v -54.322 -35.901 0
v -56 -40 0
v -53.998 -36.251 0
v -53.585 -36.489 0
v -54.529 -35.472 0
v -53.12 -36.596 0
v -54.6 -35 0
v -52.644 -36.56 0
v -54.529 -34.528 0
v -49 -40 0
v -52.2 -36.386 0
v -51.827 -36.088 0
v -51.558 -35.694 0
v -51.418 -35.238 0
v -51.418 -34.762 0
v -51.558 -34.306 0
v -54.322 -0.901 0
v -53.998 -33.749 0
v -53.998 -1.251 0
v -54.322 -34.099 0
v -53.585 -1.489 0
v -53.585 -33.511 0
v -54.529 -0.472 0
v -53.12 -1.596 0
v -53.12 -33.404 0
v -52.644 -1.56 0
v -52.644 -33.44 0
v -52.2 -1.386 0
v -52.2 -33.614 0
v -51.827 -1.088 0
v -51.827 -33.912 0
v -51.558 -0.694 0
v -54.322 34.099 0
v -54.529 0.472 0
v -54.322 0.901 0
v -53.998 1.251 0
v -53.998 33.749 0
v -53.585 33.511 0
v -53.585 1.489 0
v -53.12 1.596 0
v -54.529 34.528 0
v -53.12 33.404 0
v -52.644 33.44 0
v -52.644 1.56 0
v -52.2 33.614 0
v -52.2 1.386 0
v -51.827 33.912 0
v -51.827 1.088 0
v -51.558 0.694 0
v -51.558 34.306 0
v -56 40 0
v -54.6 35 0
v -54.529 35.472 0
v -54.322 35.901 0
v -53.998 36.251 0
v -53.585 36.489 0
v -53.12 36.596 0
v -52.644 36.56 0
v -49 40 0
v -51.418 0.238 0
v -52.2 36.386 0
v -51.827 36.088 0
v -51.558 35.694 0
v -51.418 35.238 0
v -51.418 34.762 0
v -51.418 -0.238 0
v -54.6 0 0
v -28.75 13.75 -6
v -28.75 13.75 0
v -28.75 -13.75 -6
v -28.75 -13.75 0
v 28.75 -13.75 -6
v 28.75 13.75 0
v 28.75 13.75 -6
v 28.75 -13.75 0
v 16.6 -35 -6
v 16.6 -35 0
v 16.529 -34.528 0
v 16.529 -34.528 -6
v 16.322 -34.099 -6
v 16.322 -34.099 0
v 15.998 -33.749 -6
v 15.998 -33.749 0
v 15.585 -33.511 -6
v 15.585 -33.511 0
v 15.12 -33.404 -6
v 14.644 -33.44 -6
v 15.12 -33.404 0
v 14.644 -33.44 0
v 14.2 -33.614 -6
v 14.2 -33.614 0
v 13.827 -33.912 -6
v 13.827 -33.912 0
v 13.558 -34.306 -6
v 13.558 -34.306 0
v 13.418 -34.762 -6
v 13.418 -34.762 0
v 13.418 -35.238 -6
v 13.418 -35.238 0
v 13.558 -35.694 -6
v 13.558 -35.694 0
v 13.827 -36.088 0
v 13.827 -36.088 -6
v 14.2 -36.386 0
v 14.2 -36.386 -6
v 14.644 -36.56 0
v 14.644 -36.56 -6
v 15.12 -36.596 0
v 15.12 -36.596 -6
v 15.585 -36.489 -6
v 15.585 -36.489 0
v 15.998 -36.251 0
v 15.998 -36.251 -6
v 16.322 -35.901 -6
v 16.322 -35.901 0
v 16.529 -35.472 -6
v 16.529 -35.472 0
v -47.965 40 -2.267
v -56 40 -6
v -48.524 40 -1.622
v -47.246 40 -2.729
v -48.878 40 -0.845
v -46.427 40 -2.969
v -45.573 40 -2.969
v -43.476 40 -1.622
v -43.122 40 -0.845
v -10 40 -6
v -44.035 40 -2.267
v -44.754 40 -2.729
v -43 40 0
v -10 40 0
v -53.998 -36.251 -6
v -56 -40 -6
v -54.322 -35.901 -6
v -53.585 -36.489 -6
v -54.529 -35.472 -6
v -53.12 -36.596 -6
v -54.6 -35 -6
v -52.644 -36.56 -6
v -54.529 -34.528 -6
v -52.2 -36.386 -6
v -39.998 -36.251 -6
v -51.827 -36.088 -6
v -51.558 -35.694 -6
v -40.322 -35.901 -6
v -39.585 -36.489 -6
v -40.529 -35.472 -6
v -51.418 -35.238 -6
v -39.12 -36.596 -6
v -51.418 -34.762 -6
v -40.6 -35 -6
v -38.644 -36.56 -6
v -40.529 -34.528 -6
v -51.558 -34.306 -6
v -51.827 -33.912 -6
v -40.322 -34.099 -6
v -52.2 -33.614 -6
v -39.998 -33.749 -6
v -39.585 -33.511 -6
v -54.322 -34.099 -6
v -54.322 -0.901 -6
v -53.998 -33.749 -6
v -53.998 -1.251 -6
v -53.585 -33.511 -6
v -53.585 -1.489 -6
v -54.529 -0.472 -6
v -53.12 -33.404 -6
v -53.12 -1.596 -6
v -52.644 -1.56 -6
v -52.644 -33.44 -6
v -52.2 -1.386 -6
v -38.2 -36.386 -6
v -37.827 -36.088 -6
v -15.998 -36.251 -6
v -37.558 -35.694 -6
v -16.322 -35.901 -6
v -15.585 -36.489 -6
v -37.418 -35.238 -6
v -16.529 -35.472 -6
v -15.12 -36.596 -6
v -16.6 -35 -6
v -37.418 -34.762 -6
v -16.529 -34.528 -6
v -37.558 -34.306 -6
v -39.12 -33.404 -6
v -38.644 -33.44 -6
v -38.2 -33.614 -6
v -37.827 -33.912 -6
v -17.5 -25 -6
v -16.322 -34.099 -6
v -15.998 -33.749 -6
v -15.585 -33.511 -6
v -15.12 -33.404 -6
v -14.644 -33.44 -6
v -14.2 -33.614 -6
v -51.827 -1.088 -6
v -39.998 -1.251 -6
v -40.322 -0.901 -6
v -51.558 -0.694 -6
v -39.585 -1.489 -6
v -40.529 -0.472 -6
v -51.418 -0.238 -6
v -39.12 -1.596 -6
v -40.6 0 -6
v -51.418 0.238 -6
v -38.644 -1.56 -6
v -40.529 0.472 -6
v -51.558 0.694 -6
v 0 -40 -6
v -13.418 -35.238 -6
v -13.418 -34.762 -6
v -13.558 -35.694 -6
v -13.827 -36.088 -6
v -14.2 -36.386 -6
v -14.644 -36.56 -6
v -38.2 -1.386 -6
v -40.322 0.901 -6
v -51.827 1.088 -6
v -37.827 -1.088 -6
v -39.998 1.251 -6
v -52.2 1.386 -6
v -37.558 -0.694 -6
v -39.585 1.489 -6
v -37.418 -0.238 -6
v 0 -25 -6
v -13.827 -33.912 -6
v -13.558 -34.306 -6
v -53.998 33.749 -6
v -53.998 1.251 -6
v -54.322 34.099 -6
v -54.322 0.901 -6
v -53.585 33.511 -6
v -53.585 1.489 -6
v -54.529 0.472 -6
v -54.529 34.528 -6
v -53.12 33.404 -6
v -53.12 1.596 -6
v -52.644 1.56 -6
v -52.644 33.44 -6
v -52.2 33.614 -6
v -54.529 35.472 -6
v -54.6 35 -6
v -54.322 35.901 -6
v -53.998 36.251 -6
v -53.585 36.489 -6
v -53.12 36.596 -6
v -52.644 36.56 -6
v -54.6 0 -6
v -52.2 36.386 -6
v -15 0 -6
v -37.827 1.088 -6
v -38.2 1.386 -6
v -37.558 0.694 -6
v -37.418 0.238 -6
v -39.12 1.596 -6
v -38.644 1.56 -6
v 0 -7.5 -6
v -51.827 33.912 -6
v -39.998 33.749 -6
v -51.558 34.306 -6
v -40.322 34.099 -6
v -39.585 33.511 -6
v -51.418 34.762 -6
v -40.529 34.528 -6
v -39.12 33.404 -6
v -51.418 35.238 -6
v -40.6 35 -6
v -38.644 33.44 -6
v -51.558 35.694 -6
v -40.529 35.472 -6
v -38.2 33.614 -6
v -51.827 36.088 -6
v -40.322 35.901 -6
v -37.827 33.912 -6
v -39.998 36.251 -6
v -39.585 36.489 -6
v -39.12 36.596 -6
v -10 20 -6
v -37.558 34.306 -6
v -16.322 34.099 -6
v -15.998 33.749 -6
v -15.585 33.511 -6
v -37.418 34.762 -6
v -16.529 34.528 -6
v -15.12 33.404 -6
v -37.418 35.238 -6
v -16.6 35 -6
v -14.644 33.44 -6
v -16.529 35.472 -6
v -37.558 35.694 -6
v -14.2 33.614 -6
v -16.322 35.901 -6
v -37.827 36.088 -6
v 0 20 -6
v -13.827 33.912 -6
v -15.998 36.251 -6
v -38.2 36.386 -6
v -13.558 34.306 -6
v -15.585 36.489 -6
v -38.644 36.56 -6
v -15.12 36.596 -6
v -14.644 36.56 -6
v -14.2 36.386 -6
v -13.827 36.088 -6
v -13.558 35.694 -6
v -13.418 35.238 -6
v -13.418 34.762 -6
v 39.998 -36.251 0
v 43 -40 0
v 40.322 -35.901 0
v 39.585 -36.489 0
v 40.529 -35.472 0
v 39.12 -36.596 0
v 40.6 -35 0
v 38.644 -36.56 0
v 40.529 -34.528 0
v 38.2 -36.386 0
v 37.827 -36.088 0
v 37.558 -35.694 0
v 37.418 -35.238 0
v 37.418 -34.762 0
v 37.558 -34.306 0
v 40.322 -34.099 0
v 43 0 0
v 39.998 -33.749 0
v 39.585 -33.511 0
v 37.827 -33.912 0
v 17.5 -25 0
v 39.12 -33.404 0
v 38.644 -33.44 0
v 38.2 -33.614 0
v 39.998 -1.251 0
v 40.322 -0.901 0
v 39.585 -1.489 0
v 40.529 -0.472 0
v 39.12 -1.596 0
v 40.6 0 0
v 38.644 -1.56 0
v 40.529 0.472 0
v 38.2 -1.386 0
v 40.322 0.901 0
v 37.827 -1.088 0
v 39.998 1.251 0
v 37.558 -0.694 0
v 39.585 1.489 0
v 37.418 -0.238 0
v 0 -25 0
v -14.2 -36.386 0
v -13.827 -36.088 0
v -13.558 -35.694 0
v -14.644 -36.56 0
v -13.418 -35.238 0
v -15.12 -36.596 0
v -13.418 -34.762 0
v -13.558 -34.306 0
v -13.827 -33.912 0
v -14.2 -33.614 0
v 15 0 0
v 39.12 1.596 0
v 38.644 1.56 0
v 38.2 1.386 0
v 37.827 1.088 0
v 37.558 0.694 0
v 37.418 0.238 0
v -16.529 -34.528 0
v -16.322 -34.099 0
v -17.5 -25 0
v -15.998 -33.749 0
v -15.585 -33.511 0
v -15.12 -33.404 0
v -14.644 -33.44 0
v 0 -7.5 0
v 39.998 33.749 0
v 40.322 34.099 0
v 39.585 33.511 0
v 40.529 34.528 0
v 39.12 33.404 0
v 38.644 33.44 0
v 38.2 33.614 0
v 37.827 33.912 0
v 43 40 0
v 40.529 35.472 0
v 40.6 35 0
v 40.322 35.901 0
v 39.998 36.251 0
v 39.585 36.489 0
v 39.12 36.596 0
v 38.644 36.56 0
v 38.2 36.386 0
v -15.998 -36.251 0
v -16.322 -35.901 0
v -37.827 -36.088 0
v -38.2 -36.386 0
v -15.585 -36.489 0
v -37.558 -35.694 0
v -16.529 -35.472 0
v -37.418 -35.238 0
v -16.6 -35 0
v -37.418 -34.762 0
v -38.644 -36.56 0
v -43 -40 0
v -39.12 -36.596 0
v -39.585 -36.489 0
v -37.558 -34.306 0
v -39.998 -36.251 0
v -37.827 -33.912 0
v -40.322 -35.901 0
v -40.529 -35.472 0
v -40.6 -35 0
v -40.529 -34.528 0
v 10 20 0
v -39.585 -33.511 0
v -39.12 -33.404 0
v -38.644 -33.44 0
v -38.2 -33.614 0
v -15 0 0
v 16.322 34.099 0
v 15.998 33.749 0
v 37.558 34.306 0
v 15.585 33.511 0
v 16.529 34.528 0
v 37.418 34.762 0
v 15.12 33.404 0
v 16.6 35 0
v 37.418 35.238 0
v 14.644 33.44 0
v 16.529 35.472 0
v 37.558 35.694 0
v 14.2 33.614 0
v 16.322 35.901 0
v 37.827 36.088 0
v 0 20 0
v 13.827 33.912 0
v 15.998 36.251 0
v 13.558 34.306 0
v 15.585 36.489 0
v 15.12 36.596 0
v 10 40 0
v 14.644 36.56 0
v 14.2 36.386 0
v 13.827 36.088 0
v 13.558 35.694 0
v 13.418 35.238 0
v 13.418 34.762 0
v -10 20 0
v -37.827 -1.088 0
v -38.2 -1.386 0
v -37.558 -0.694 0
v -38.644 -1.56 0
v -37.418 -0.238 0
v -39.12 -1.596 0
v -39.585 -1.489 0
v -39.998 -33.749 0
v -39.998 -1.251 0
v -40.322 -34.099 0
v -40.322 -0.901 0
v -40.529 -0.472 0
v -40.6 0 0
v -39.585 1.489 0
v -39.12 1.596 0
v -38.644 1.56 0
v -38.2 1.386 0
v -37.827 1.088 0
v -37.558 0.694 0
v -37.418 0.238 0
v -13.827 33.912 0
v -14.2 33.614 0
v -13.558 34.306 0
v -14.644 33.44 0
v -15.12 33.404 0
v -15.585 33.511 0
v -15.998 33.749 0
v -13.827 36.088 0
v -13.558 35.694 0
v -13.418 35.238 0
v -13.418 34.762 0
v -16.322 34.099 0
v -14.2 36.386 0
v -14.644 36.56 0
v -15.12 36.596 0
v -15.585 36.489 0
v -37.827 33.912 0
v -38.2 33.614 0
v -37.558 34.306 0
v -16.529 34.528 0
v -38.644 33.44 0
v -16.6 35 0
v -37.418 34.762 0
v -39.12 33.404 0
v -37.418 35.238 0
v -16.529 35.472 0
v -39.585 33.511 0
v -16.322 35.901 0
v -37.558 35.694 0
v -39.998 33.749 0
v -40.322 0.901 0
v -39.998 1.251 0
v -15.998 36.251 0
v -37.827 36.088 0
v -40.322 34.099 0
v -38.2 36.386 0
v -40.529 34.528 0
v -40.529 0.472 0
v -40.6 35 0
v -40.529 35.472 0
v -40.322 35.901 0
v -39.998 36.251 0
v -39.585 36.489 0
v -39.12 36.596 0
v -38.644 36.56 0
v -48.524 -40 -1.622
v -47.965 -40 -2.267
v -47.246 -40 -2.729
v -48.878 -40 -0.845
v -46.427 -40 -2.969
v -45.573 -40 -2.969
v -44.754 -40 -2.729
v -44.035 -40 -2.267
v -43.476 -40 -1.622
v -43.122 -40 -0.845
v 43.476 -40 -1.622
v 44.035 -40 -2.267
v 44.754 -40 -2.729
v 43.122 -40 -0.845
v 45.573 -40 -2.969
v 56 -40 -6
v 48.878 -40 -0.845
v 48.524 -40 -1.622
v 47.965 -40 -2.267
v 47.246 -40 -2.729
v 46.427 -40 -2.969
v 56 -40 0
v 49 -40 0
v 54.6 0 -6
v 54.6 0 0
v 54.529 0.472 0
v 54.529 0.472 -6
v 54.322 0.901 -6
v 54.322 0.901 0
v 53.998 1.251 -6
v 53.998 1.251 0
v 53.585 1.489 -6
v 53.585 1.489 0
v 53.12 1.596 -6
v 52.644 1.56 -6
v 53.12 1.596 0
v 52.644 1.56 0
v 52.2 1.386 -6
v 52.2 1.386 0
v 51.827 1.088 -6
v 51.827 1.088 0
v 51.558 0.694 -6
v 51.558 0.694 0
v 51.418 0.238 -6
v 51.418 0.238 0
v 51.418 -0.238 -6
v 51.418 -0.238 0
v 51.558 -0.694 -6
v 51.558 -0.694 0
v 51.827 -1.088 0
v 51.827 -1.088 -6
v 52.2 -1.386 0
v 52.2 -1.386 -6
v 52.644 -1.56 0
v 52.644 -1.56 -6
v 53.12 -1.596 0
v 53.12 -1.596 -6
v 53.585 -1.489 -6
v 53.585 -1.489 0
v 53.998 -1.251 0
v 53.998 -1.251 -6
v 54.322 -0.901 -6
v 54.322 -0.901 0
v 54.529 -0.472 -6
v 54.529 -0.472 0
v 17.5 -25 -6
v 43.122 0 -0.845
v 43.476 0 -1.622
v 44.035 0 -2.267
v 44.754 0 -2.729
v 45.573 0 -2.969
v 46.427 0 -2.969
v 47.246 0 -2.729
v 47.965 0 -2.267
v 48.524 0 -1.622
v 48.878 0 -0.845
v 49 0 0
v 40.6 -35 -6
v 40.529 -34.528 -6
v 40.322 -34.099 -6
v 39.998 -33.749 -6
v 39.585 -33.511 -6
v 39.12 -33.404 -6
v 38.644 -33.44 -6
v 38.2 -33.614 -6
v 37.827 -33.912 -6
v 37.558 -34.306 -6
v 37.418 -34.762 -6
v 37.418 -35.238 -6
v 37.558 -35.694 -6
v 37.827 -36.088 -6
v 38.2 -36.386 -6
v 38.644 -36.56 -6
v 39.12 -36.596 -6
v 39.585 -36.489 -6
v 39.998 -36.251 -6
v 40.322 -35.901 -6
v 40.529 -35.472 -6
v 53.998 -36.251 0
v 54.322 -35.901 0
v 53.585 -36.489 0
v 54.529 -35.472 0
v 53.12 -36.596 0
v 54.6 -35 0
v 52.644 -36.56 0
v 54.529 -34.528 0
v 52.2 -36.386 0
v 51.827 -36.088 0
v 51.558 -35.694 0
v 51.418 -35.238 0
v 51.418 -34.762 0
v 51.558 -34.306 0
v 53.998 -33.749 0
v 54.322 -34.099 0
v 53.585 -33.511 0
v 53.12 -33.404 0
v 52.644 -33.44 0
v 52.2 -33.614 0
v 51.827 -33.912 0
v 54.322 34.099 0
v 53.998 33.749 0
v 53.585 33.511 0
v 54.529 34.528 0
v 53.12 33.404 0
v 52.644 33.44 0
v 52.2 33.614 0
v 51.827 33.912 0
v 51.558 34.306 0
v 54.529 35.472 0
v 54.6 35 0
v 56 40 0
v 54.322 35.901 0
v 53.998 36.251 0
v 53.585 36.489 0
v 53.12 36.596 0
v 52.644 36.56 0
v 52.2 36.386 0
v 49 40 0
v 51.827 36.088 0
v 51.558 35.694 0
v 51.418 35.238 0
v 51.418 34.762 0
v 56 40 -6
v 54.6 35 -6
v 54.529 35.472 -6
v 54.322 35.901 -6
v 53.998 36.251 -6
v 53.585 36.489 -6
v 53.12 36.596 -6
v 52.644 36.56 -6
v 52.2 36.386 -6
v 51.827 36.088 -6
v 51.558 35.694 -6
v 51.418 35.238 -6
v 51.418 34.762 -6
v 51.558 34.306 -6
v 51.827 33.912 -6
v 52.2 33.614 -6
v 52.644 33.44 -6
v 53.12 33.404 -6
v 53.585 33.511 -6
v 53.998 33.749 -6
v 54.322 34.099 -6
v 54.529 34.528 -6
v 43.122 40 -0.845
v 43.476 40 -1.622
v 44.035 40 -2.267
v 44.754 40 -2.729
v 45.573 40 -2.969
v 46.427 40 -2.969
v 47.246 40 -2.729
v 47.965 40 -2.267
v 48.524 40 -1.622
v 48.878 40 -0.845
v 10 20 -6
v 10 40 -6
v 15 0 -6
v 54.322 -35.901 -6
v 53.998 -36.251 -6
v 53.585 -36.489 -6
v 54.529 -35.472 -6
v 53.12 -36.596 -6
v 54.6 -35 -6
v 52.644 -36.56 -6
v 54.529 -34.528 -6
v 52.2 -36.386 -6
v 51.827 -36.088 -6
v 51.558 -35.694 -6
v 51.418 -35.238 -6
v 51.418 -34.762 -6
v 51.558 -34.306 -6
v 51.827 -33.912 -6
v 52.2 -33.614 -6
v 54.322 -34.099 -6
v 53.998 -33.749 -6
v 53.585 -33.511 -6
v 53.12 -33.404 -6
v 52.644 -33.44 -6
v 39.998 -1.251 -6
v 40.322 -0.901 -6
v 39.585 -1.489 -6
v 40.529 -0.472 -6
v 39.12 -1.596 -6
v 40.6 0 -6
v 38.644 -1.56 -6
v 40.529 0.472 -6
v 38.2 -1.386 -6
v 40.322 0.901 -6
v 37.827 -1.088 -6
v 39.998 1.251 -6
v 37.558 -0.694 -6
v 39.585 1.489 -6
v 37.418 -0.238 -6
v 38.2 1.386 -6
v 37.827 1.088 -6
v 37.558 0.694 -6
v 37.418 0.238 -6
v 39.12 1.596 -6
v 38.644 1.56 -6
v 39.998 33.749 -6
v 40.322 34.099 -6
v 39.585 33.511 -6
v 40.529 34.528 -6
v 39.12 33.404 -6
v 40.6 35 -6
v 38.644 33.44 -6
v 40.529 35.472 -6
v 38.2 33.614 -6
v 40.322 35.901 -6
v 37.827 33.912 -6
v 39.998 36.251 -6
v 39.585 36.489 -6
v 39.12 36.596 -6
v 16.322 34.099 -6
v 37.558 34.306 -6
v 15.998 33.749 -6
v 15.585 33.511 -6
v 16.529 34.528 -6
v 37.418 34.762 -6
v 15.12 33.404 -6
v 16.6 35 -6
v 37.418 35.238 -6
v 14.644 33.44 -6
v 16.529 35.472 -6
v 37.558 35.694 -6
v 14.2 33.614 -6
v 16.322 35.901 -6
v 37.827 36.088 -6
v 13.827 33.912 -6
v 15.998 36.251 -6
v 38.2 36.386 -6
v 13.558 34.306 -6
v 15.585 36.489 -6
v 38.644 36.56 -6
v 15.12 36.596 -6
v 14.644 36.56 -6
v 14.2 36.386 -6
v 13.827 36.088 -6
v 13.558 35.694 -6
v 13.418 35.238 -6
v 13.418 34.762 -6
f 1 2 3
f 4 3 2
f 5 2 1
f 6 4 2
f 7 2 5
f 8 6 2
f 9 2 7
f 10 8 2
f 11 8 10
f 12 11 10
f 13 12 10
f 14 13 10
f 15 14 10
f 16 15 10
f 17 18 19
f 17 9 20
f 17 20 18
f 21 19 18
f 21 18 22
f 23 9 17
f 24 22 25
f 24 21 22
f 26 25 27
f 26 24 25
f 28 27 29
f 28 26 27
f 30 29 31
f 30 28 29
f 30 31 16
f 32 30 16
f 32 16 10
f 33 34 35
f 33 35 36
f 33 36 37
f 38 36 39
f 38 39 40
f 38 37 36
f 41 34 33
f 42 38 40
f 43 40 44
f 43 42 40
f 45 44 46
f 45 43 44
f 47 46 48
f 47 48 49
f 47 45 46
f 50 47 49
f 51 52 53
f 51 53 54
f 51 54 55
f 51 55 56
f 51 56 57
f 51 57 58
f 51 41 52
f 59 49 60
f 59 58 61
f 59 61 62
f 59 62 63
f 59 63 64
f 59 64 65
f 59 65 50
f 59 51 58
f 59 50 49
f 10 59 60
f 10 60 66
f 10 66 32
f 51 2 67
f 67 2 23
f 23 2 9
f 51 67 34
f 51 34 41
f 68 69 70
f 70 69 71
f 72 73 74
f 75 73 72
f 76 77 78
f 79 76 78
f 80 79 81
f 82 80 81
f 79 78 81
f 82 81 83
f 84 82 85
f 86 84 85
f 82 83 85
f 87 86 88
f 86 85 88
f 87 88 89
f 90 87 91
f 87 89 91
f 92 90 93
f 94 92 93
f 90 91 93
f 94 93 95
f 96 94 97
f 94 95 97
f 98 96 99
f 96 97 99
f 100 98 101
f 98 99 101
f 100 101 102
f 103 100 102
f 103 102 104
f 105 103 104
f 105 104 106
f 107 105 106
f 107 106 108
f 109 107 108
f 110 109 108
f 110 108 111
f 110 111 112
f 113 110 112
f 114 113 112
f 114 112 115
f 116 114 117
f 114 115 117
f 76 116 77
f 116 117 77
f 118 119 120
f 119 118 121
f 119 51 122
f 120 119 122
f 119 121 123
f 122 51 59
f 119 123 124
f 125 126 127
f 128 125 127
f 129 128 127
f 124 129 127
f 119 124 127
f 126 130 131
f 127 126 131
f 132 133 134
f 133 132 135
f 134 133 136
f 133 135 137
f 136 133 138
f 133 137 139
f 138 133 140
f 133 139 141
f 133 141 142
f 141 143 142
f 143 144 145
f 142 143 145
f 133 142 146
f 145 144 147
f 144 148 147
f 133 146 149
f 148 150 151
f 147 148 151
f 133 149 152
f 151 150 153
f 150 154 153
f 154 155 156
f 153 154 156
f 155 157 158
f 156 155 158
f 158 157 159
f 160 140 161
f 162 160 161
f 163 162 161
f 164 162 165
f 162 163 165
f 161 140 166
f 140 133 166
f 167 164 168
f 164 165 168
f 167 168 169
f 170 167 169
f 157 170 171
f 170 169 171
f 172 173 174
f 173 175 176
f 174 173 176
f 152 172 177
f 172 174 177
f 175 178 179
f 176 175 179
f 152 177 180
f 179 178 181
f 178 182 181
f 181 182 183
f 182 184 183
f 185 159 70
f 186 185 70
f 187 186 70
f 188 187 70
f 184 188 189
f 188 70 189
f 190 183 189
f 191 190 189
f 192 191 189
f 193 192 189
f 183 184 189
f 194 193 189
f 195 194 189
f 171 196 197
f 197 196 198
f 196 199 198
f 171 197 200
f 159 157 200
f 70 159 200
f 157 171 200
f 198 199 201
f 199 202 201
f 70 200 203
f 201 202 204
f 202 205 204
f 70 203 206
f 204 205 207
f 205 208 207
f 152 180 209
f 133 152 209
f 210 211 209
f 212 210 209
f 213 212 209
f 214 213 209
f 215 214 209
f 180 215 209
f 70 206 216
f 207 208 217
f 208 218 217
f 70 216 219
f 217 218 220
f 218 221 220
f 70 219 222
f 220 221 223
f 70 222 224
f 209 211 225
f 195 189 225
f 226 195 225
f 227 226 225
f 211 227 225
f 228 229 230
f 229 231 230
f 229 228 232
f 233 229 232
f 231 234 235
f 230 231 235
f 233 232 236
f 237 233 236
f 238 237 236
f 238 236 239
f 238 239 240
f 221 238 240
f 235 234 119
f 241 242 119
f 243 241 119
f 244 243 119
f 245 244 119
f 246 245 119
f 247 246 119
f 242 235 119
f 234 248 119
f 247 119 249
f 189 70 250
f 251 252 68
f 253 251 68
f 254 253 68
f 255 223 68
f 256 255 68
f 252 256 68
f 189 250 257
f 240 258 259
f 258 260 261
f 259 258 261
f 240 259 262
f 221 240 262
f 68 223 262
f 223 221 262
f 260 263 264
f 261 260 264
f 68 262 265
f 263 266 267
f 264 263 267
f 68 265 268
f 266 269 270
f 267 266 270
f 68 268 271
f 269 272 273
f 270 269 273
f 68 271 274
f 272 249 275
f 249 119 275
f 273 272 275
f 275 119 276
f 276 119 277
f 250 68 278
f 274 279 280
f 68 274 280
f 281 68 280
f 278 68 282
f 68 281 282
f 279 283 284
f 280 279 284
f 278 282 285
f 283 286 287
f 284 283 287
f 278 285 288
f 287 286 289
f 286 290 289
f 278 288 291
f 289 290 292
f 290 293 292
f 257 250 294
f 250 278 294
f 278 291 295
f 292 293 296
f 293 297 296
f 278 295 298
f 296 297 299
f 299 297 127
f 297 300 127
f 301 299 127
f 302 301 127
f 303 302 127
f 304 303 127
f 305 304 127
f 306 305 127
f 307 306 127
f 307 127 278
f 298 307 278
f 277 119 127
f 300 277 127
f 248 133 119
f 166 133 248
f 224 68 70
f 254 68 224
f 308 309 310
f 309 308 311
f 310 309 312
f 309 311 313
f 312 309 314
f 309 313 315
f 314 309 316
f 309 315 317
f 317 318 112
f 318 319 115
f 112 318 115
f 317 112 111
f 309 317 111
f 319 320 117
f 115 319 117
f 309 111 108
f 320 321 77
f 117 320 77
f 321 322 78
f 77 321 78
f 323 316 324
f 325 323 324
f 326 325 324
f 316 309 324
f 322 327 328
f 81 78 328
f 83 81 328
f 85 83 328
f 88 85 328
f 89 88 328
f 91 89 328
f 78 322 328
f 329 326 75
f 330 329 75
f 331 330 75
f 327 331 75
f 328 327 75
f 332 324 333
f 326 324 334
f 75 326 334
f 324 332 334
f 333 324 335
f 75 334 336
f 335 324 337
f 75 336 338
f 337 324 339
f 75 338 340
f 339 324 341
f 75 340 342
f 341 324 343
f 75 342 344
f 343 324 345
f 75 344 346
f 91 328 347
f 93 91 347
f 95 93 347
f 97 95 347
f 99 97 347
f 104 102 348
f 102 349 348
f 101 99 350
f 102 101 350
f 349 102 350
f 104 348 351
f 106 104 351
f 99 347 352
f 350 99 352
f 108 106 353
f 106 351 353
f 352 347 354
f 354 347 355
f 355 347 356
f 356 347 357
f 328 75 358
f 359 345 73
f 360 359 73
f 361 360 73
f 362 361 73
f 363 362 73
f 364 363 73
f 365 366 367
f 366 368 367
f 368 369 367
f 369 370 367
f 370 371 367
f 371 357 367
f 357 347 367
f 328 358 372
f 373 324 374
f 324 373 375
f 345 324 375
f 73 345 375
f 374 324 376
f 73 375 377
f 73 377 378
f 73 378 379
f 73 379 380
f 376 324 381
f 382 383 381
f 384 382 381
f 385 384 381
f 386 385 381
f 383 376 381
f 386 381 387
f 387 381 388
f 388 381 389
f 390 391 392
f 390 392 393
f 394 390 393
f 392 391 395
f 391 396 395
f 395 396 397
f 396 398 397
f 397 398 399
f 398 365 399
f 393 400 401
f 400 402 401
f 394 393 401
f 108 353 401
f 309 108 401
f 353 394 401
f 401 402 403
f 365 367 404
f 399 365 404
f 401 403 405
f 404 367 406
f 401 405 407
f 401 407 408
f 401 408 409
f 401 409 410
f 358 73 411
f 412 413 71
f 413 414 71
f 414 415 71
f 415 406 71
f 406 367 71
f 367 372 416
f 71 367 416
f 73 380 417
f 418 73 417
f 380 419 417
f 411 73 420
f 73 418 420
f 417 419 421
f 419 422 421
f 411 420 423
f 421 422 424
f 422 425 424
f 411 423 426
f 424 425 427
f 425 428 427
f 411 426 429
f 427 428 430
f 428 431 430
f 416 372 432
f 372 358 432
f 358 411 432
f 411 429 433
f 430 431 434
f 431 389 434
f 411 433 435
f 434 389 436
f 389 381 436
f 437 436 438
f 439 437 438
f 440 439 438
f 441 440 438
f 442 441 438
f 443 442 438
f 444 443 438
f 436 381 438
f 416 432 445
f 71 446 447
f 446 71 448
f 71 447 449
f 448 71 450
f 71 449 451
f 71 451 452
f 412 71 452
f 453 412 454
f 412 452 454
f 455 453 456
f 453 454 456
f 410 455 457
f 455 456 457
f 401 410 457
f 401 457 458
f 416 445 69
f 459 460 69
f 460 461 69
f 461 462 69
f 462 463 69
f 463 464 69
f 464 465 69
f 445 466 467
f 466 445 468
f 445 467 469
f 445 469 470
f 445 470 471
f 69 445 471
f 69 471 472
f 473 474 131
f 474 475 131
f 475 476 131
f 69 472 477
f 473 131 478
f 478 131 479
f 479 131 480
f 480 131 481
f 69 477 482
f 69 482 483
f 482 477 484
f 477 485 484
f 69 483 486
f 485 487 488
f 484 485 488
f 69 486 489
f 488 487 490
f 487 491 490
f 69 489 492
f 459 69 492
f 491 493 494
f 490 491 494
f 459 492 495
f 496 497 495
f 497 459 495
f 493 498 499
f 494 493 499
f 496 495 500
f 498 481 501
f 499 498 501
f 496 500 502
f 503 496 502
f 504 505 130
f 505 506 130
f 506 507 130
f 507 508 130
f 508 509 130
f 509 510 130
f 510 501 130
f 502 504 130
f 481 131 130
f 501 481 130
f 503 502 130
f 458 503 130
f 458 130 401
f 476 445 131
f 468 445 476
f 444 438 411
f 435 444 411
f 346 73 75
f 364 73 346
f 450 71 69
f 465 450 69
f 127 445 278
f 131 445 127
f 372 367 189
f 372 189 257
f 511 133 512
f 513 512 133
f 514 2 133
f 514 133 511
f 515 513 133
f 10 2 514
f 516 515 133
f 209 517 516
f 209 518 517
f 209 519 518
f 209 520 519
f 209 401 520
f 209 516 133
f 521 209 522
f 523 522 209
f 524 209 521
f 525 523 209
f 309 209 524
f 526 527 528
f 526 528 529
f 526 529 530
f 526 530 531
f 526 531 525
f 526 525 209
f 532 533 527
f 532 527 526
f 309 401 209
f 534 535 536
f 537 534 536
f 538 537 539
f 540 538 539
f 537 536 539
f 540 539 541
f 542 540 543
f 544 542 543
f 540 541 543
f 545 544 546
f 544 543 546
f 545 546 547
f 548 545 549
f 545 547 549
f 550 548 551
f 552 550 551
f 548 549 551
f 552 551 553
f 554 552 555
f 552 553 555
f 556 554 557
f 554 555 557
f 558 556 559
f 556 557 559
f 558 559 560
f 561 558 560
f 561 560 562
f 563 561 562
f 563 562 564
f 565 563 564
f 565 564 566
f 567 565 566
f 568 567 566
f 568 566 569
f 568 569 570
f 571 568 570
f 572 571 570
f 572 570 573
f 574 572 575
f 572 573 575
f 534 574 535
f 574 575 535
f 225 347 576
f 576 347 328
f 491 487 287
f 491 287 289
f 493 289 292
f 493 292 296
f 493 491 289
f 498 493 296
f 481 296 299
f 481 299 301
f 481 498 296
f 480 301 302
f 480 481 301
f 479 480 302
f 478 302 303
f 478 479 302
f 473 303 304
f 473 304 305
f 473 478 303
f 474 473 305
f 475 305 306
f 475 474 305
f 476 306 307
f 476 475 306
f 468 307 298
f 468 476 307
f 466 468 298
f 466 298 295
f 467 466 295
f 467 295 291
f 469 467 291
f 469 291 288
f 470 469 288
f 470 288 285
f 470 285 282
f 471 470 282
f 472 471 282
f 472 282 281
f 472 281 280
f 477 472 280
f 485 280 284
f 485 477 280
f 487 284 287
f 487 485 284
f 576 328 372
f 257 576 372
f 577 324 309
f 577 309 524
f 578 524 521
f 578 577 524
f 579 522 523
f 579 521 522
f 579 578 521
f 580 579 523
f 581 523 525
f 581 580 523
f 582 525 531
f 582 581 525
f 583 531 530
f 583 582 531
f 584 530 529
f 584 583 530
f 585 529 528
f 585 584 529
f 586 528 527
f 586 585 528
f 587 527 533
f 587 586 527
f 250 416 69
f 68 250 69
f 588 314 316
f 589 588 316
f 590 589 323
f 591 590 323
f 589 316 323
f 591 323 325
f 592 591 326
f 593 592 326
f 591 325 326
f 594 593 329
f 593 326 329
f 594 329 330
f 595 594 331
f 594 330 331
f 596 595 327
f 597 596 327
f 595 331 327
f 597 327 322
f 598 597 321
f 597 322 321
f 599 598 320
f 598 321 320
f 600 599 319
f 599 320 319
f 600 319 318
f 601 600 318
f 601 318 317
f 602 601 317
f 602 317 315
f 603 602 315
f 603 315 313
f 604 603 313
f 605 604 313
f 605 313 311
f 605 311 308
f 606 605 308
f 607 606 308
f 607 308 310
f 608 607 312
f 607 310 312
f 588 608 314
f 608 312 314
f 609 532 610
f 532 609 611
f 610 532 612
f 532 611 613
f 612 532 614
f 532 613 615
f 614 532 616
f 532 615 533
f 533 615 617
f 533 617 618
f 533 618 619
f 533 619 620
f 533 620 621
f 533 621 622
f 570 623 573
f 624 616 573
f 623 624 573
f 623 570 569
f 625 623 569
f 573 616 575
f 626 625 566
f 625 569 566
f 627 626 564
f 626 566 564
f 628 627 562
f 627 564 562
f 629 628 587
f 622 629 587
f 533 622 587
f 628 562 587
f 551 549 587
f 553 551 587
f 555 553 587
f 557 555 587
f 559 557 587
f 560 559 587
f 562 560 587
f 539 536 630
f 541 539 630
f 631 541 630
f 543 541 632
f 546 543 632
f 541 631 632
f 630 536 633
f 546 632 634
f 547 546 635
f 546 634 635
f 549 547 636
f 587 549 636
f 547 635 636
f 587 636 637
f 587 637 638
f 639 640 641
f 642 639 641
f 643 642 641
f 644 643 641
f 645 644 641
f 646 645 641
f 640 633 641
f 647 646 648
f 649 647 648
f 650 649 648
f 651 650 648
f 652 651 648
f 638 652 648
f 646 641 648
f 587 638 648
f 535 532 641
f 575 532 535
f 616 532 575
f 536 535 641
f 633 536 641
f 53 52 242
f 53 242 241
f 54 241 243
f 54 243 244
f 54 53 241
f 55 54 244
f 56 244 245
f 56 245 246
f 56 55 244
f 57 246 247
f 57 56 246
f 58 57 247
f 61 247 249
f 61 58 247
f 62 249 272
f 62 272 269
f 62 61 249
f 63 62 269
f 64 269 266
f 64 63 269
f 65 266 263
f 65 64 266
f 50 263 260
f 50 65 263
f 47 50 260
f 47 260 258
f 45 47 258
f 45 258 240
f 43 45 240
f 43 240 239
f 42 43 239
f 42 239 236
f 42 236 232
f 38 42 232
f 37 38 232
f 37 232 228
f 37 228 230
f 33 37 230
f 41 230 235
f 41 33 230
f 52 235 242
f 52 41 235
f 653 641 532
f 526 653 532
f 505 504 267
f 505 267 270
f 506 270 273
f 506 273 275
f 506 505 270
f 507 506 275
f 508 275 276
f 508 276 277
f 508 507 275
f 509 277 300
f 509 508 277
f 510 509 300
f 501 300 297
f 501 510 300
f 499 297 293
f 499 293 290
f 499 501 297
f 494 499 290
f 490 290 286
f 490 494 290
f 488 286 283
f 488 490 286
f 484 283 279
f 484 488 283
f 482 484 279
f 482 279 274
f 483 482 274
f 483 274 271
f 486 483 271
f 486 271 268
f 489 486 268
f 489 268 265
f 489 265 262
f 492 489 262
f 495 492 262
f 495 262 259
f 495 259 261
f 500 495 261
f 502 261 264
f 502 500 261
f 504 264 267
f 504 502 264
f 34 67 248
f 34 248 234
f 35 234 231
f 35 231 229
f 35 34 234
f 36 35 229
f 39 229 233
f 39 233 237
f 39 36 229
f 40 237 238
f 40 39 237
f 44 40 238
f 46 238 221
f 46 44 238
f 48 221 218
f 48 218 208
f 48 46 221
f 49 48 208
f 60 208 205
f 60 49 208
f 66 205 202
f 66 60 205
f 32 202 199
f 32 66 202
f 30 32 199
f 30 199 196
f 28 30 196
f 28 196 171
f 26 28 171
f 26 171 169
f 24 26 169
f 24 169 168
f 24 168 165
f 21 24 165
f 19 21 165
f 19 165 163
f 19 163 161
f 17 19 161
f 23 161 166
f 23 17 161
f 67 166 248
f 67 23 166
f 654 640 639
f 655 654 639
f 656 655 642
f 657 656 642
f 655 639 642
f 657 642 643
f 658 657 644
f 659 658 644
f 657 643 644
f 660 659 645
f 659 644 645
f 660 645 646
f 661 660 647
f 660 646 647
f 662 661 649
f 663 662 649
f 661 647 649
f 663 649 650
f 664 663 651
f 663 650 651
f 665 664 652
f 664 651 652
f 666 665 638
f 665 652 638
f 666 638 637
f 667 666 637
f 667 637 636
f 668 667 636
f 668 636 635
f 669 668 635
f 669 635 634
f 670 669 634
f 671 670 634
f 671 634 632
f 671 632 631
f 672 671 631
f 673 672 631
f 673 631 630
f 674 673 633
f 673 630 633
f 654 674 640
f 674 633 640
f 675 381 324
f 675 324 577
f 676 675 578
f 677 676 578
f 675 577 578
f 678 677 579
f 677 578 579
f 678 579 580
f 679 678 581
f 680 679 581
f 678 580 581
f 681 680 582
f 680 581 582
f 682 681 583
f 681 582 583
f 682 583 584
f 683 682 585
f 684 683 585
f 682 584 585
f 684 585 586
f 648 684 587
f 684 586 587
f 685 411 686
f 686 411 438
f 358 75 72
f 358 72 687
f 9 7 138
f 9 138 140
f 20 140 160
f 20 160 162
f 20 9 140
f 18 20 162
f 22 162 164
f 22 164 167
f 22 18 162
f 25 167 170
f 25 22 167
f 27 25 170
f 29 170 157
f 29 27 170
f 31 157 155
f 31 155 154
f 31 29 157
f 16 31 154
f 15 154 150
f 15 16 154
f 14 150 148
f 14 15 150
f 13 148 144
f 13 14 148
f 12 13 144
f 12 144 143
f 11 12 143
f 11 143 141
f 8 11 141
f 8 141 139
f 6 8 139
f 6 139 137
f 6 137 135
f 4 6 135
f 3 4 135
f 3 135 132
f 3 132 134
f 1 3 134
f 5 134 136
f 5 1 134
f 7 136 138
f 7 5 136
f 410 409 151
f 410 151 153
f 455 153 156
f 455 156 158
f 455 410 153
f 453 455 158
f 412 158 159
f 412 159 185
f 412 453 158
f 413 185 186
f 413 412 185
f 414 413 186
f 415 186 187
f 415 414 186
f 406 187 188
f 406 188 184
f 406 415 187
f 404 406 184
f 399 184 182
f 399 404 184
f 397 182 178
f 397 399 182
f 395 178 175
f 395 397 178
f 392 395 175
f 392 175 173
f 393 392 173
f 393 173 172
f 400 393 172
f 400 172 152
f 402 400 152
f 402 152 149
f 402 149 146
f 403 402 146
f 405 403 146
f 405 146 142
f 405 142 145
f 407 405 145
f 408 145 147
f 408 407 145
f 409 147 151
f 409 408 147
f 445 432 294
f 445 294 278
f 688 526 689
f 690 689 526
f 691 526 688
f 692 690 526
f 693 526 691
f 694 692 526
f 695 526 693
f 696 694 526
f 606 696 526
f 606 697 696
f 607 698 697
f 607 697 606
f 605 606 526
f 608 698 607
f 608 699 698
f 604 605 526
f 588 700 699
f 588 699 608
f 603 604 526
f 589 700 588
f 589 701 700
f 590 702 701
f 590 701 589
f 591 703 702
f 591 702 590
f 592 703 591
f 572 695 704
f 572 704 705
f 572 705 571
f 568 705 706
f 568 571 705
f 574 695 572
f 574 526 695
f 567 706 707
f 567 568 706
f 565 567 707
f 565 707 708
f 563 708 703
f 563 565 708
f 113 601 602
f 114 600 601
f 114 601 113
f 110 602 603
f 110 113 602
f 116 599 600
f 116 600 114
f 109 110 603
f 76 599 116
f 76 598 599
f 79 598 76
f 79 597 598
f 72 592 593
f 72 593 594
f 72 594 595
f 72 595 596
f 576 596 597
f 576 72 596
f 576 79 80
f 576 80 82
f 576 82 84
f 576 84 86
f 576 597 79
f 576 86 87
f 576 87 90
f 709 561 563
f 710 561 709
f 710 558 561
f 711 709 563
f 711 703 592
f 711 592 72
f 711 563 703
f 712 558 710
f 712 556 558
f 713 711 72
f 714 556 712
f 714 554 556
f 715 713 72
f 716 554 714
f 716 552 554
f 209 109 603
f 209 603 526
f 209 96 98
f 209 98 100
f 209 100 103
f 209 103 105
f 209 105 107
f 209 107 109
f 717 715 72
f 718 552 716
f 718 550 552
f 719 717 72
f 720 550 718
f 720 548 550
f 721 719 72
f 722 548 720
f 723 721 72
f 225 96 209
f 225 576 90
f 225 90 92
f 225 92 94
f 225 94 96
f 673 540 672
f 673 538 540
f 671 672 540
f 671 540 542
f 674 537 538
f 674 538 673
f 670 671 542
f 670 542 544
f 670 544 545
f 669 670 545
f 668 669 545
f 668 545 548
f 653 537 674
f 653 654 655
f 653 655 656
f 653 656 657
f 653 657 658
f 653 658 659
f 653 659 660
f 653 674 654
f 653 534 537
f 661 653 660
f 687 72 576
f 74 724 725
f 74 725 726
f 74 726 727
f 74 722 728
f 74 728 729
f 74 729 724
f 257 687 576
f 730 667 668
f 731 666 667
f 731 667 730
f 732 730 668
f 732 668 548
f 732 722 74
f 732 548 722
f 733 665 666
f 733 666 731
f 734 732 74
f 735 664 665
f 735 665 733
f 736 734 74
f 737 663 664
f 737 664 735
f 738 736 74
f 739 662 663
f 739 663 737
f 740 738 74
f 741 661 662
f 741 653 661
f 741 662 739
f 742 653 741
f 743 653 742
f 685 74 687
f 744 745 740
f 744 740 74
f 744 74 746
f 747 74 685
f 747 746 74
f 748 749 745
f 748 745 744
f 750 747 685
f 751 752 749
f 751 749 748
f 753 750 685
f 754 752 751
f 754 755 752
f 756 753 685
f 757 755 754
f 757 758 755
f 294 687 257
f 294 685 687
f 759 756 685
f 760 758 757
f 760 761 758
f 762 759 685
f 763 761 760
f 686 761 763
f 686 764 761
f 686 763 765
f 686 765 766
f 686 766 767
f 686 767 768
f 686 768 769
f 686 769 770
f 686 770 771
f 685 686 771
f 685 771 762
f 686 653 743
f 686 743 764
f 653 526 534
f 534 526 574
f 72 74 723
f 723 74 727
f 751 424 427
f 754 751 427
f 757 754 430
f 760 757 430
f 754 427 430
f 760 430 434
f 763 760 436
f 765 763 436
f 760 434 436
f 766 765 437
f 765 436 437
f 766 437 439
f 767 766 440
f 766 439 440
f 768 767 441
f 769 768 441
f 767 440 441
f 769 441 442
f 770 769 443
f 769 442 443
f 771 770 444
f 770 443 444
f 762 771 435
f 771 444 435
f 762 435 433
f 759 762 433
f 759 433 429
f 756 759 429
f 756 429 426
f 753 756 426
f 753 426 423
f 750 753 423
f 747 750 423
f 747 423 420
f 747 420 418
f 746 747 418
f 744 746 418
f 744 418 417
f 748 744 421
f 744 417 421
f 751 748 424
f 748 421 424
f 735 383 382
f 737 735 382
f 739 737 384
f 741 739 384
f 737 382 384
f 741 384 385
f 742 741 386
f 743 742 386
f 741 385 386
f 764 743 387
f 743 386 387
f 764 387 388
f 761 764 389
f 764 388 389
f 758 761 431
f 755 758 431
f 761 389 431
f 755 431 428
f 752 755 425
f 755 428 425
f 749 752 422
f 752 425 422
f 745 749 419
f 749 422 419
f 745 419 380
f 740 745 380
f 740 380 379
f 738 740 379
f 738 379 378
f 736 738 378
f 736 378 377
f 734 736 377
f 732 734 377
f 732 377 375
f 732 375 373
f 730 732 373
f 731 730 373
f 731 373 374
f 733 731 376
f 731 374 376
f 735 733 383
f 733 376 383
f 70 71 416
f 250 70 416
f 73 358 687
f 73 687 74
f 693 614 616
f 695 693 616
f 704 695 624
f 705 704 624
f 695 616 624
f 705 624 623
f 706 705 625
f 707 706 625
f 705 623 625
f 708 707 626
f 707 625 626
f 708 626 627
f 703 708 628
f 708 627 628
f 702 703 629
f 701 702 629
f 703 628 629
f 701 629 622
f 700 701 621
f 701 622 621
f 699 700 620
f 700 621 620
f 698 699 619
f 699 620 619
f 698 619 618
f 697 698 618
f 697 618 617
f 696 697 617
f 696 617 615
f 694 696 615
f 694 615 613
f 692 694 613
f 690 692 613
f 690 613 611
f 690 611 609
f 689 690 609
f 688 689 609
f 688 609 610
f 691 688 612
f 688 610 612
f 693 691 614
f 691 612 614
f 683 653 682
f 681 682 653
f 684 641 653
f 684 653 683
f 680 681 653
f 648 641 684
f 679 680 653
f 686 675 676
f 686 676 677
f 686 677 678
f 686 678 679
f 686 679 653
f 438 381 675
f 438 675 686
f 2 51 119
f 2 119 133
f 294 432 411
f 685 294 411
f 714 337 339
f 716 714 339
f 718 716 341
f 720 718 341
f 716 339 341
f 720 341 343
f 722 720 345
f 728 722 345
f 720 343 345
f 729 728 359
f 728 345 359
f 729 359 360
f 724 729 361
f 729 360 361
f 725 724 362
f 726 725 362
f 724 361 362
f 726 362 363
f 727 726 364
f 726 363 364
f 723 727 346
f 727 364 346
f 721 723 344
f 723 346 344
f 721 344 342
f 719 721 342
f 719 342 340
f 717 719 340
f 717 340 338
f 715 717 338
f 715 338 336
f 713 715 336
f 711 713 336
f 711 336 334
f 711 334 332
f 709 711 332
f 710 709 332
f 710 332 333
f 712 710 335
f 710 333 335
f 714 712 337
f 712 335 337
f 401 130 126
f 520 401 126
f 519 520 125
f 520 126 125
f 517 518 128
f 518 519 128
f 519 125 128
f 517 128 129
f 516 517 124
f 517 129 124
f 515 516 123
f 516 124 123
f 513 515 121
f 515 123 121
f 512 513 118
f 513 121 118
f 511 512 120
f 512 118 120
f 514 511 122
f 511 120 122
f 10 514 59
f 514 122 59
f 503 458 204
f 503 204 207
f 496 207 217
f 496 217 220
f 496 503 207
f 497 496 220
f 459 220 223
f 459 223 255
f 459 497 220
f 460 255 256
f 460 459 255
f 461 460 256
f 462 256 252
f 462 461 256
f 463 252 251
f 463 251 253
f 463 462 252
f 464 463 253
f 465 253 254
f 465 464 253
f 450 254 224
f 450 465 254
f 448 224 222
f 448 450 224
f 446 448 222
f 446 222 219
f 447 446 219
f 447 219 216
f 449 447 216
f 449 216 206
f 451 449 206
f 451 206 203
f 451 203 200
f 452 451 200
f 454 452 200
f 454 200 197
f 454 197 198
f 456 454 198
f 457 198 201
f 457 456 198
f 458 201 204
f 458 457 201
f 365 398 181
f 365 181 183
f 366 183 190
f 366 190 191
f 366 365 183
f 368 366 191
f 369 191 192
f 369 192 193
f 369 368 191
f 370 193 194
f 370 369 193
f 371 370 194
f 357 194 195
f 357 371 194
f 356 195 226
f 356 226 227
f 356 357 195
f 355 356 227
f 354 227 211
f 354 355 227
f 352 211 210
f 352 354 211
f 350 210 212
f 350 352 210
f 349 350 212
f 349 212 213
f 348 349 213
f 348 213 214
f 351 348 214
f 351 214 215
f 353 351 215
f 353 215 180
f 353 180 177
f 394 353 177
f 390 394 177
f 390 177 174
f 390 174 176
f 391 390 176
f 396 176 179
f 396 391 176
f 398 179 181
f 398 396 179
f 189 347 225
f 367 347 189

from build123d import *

# Parameters (mm, degrees)
SKETCH_R          = 1.6
PAD_DEPTH         = 6
SKETCH001_R       = 3
POCKET_DEPTH      = 40.001
POCKET_DEPTH_BACK = 40.001


with BuildPart() as toolbody:
    # Sketch → Pad (new body)
    with BuildSketch(Plane.XY):
        Polygon((46, -40), (0, -40), (0, -25), (17.5, -25), (0, -7.5), (0, 7.5), (0, 20), (10, 20), (10, 40), (46, 40), (56, 40), (56, -40), align=None)
        with Locations((53, 0)):
            Circle(SKETCH_R, mode=Mode.SUBTRACT)
        with Locations((53, 35)):
            Circle(SKETCH_R, mode=Mode.SUBTRACT)
        with Locations((53, -35)):
            Circle(SKETCH_R, mode=Mode.SUBTRACT)
        with Locations((39, 35)):
            Circle(SKETCH_R, mode=Mode.SUBTRACT)
        with Locations((39, 0)):
            Circle(SKETCH_R, mode=Mode.SUBTRACT)
        with Locations((39, -35)):
            Circle(SKETCH_R, mode=Mode.SUBTRACT)
        with Locations((15, 35)):
            Circle(SKETCH_R, mode=Mode.SUBTRACT)
        with Locations((15, -35)):
            Circle(SKETCH_R, mode=Mode.SUBTRACT)
        Polygon((15, 0), (28.75, 13.75), (28.75, -13.75), align=None, mode=Mode.SUBTRACT)
    extrude(amount=-PAD_DEPTH)

    # Sketch001 → Pocket (cut, two sides)
    with BuildSketch(Plane.XZ) as pocket_sk:
        with Locations((46, 0)):
            Circle(SKETCH001_R)
    extrude(amount=-POCKET_DEPTH, mode=Mode.SUBTRACT)
    extrude(pocket_sk.sketch, amount=POCKET_DEPTH_BACK, mode=Mode.SUBTRACT)


with BuildPart() as toolfusion:
    # Part__Mirroring: instance of ToolBody
    add(toolbody.part.mirror(Plane(origin=(0, 0, 0), x_dir=(0, -1, 0), z_dir=(1, 0, 0))))

    # Fusion: union ToolBody
    add(toolbody.part)


solid = toolfusion.part
